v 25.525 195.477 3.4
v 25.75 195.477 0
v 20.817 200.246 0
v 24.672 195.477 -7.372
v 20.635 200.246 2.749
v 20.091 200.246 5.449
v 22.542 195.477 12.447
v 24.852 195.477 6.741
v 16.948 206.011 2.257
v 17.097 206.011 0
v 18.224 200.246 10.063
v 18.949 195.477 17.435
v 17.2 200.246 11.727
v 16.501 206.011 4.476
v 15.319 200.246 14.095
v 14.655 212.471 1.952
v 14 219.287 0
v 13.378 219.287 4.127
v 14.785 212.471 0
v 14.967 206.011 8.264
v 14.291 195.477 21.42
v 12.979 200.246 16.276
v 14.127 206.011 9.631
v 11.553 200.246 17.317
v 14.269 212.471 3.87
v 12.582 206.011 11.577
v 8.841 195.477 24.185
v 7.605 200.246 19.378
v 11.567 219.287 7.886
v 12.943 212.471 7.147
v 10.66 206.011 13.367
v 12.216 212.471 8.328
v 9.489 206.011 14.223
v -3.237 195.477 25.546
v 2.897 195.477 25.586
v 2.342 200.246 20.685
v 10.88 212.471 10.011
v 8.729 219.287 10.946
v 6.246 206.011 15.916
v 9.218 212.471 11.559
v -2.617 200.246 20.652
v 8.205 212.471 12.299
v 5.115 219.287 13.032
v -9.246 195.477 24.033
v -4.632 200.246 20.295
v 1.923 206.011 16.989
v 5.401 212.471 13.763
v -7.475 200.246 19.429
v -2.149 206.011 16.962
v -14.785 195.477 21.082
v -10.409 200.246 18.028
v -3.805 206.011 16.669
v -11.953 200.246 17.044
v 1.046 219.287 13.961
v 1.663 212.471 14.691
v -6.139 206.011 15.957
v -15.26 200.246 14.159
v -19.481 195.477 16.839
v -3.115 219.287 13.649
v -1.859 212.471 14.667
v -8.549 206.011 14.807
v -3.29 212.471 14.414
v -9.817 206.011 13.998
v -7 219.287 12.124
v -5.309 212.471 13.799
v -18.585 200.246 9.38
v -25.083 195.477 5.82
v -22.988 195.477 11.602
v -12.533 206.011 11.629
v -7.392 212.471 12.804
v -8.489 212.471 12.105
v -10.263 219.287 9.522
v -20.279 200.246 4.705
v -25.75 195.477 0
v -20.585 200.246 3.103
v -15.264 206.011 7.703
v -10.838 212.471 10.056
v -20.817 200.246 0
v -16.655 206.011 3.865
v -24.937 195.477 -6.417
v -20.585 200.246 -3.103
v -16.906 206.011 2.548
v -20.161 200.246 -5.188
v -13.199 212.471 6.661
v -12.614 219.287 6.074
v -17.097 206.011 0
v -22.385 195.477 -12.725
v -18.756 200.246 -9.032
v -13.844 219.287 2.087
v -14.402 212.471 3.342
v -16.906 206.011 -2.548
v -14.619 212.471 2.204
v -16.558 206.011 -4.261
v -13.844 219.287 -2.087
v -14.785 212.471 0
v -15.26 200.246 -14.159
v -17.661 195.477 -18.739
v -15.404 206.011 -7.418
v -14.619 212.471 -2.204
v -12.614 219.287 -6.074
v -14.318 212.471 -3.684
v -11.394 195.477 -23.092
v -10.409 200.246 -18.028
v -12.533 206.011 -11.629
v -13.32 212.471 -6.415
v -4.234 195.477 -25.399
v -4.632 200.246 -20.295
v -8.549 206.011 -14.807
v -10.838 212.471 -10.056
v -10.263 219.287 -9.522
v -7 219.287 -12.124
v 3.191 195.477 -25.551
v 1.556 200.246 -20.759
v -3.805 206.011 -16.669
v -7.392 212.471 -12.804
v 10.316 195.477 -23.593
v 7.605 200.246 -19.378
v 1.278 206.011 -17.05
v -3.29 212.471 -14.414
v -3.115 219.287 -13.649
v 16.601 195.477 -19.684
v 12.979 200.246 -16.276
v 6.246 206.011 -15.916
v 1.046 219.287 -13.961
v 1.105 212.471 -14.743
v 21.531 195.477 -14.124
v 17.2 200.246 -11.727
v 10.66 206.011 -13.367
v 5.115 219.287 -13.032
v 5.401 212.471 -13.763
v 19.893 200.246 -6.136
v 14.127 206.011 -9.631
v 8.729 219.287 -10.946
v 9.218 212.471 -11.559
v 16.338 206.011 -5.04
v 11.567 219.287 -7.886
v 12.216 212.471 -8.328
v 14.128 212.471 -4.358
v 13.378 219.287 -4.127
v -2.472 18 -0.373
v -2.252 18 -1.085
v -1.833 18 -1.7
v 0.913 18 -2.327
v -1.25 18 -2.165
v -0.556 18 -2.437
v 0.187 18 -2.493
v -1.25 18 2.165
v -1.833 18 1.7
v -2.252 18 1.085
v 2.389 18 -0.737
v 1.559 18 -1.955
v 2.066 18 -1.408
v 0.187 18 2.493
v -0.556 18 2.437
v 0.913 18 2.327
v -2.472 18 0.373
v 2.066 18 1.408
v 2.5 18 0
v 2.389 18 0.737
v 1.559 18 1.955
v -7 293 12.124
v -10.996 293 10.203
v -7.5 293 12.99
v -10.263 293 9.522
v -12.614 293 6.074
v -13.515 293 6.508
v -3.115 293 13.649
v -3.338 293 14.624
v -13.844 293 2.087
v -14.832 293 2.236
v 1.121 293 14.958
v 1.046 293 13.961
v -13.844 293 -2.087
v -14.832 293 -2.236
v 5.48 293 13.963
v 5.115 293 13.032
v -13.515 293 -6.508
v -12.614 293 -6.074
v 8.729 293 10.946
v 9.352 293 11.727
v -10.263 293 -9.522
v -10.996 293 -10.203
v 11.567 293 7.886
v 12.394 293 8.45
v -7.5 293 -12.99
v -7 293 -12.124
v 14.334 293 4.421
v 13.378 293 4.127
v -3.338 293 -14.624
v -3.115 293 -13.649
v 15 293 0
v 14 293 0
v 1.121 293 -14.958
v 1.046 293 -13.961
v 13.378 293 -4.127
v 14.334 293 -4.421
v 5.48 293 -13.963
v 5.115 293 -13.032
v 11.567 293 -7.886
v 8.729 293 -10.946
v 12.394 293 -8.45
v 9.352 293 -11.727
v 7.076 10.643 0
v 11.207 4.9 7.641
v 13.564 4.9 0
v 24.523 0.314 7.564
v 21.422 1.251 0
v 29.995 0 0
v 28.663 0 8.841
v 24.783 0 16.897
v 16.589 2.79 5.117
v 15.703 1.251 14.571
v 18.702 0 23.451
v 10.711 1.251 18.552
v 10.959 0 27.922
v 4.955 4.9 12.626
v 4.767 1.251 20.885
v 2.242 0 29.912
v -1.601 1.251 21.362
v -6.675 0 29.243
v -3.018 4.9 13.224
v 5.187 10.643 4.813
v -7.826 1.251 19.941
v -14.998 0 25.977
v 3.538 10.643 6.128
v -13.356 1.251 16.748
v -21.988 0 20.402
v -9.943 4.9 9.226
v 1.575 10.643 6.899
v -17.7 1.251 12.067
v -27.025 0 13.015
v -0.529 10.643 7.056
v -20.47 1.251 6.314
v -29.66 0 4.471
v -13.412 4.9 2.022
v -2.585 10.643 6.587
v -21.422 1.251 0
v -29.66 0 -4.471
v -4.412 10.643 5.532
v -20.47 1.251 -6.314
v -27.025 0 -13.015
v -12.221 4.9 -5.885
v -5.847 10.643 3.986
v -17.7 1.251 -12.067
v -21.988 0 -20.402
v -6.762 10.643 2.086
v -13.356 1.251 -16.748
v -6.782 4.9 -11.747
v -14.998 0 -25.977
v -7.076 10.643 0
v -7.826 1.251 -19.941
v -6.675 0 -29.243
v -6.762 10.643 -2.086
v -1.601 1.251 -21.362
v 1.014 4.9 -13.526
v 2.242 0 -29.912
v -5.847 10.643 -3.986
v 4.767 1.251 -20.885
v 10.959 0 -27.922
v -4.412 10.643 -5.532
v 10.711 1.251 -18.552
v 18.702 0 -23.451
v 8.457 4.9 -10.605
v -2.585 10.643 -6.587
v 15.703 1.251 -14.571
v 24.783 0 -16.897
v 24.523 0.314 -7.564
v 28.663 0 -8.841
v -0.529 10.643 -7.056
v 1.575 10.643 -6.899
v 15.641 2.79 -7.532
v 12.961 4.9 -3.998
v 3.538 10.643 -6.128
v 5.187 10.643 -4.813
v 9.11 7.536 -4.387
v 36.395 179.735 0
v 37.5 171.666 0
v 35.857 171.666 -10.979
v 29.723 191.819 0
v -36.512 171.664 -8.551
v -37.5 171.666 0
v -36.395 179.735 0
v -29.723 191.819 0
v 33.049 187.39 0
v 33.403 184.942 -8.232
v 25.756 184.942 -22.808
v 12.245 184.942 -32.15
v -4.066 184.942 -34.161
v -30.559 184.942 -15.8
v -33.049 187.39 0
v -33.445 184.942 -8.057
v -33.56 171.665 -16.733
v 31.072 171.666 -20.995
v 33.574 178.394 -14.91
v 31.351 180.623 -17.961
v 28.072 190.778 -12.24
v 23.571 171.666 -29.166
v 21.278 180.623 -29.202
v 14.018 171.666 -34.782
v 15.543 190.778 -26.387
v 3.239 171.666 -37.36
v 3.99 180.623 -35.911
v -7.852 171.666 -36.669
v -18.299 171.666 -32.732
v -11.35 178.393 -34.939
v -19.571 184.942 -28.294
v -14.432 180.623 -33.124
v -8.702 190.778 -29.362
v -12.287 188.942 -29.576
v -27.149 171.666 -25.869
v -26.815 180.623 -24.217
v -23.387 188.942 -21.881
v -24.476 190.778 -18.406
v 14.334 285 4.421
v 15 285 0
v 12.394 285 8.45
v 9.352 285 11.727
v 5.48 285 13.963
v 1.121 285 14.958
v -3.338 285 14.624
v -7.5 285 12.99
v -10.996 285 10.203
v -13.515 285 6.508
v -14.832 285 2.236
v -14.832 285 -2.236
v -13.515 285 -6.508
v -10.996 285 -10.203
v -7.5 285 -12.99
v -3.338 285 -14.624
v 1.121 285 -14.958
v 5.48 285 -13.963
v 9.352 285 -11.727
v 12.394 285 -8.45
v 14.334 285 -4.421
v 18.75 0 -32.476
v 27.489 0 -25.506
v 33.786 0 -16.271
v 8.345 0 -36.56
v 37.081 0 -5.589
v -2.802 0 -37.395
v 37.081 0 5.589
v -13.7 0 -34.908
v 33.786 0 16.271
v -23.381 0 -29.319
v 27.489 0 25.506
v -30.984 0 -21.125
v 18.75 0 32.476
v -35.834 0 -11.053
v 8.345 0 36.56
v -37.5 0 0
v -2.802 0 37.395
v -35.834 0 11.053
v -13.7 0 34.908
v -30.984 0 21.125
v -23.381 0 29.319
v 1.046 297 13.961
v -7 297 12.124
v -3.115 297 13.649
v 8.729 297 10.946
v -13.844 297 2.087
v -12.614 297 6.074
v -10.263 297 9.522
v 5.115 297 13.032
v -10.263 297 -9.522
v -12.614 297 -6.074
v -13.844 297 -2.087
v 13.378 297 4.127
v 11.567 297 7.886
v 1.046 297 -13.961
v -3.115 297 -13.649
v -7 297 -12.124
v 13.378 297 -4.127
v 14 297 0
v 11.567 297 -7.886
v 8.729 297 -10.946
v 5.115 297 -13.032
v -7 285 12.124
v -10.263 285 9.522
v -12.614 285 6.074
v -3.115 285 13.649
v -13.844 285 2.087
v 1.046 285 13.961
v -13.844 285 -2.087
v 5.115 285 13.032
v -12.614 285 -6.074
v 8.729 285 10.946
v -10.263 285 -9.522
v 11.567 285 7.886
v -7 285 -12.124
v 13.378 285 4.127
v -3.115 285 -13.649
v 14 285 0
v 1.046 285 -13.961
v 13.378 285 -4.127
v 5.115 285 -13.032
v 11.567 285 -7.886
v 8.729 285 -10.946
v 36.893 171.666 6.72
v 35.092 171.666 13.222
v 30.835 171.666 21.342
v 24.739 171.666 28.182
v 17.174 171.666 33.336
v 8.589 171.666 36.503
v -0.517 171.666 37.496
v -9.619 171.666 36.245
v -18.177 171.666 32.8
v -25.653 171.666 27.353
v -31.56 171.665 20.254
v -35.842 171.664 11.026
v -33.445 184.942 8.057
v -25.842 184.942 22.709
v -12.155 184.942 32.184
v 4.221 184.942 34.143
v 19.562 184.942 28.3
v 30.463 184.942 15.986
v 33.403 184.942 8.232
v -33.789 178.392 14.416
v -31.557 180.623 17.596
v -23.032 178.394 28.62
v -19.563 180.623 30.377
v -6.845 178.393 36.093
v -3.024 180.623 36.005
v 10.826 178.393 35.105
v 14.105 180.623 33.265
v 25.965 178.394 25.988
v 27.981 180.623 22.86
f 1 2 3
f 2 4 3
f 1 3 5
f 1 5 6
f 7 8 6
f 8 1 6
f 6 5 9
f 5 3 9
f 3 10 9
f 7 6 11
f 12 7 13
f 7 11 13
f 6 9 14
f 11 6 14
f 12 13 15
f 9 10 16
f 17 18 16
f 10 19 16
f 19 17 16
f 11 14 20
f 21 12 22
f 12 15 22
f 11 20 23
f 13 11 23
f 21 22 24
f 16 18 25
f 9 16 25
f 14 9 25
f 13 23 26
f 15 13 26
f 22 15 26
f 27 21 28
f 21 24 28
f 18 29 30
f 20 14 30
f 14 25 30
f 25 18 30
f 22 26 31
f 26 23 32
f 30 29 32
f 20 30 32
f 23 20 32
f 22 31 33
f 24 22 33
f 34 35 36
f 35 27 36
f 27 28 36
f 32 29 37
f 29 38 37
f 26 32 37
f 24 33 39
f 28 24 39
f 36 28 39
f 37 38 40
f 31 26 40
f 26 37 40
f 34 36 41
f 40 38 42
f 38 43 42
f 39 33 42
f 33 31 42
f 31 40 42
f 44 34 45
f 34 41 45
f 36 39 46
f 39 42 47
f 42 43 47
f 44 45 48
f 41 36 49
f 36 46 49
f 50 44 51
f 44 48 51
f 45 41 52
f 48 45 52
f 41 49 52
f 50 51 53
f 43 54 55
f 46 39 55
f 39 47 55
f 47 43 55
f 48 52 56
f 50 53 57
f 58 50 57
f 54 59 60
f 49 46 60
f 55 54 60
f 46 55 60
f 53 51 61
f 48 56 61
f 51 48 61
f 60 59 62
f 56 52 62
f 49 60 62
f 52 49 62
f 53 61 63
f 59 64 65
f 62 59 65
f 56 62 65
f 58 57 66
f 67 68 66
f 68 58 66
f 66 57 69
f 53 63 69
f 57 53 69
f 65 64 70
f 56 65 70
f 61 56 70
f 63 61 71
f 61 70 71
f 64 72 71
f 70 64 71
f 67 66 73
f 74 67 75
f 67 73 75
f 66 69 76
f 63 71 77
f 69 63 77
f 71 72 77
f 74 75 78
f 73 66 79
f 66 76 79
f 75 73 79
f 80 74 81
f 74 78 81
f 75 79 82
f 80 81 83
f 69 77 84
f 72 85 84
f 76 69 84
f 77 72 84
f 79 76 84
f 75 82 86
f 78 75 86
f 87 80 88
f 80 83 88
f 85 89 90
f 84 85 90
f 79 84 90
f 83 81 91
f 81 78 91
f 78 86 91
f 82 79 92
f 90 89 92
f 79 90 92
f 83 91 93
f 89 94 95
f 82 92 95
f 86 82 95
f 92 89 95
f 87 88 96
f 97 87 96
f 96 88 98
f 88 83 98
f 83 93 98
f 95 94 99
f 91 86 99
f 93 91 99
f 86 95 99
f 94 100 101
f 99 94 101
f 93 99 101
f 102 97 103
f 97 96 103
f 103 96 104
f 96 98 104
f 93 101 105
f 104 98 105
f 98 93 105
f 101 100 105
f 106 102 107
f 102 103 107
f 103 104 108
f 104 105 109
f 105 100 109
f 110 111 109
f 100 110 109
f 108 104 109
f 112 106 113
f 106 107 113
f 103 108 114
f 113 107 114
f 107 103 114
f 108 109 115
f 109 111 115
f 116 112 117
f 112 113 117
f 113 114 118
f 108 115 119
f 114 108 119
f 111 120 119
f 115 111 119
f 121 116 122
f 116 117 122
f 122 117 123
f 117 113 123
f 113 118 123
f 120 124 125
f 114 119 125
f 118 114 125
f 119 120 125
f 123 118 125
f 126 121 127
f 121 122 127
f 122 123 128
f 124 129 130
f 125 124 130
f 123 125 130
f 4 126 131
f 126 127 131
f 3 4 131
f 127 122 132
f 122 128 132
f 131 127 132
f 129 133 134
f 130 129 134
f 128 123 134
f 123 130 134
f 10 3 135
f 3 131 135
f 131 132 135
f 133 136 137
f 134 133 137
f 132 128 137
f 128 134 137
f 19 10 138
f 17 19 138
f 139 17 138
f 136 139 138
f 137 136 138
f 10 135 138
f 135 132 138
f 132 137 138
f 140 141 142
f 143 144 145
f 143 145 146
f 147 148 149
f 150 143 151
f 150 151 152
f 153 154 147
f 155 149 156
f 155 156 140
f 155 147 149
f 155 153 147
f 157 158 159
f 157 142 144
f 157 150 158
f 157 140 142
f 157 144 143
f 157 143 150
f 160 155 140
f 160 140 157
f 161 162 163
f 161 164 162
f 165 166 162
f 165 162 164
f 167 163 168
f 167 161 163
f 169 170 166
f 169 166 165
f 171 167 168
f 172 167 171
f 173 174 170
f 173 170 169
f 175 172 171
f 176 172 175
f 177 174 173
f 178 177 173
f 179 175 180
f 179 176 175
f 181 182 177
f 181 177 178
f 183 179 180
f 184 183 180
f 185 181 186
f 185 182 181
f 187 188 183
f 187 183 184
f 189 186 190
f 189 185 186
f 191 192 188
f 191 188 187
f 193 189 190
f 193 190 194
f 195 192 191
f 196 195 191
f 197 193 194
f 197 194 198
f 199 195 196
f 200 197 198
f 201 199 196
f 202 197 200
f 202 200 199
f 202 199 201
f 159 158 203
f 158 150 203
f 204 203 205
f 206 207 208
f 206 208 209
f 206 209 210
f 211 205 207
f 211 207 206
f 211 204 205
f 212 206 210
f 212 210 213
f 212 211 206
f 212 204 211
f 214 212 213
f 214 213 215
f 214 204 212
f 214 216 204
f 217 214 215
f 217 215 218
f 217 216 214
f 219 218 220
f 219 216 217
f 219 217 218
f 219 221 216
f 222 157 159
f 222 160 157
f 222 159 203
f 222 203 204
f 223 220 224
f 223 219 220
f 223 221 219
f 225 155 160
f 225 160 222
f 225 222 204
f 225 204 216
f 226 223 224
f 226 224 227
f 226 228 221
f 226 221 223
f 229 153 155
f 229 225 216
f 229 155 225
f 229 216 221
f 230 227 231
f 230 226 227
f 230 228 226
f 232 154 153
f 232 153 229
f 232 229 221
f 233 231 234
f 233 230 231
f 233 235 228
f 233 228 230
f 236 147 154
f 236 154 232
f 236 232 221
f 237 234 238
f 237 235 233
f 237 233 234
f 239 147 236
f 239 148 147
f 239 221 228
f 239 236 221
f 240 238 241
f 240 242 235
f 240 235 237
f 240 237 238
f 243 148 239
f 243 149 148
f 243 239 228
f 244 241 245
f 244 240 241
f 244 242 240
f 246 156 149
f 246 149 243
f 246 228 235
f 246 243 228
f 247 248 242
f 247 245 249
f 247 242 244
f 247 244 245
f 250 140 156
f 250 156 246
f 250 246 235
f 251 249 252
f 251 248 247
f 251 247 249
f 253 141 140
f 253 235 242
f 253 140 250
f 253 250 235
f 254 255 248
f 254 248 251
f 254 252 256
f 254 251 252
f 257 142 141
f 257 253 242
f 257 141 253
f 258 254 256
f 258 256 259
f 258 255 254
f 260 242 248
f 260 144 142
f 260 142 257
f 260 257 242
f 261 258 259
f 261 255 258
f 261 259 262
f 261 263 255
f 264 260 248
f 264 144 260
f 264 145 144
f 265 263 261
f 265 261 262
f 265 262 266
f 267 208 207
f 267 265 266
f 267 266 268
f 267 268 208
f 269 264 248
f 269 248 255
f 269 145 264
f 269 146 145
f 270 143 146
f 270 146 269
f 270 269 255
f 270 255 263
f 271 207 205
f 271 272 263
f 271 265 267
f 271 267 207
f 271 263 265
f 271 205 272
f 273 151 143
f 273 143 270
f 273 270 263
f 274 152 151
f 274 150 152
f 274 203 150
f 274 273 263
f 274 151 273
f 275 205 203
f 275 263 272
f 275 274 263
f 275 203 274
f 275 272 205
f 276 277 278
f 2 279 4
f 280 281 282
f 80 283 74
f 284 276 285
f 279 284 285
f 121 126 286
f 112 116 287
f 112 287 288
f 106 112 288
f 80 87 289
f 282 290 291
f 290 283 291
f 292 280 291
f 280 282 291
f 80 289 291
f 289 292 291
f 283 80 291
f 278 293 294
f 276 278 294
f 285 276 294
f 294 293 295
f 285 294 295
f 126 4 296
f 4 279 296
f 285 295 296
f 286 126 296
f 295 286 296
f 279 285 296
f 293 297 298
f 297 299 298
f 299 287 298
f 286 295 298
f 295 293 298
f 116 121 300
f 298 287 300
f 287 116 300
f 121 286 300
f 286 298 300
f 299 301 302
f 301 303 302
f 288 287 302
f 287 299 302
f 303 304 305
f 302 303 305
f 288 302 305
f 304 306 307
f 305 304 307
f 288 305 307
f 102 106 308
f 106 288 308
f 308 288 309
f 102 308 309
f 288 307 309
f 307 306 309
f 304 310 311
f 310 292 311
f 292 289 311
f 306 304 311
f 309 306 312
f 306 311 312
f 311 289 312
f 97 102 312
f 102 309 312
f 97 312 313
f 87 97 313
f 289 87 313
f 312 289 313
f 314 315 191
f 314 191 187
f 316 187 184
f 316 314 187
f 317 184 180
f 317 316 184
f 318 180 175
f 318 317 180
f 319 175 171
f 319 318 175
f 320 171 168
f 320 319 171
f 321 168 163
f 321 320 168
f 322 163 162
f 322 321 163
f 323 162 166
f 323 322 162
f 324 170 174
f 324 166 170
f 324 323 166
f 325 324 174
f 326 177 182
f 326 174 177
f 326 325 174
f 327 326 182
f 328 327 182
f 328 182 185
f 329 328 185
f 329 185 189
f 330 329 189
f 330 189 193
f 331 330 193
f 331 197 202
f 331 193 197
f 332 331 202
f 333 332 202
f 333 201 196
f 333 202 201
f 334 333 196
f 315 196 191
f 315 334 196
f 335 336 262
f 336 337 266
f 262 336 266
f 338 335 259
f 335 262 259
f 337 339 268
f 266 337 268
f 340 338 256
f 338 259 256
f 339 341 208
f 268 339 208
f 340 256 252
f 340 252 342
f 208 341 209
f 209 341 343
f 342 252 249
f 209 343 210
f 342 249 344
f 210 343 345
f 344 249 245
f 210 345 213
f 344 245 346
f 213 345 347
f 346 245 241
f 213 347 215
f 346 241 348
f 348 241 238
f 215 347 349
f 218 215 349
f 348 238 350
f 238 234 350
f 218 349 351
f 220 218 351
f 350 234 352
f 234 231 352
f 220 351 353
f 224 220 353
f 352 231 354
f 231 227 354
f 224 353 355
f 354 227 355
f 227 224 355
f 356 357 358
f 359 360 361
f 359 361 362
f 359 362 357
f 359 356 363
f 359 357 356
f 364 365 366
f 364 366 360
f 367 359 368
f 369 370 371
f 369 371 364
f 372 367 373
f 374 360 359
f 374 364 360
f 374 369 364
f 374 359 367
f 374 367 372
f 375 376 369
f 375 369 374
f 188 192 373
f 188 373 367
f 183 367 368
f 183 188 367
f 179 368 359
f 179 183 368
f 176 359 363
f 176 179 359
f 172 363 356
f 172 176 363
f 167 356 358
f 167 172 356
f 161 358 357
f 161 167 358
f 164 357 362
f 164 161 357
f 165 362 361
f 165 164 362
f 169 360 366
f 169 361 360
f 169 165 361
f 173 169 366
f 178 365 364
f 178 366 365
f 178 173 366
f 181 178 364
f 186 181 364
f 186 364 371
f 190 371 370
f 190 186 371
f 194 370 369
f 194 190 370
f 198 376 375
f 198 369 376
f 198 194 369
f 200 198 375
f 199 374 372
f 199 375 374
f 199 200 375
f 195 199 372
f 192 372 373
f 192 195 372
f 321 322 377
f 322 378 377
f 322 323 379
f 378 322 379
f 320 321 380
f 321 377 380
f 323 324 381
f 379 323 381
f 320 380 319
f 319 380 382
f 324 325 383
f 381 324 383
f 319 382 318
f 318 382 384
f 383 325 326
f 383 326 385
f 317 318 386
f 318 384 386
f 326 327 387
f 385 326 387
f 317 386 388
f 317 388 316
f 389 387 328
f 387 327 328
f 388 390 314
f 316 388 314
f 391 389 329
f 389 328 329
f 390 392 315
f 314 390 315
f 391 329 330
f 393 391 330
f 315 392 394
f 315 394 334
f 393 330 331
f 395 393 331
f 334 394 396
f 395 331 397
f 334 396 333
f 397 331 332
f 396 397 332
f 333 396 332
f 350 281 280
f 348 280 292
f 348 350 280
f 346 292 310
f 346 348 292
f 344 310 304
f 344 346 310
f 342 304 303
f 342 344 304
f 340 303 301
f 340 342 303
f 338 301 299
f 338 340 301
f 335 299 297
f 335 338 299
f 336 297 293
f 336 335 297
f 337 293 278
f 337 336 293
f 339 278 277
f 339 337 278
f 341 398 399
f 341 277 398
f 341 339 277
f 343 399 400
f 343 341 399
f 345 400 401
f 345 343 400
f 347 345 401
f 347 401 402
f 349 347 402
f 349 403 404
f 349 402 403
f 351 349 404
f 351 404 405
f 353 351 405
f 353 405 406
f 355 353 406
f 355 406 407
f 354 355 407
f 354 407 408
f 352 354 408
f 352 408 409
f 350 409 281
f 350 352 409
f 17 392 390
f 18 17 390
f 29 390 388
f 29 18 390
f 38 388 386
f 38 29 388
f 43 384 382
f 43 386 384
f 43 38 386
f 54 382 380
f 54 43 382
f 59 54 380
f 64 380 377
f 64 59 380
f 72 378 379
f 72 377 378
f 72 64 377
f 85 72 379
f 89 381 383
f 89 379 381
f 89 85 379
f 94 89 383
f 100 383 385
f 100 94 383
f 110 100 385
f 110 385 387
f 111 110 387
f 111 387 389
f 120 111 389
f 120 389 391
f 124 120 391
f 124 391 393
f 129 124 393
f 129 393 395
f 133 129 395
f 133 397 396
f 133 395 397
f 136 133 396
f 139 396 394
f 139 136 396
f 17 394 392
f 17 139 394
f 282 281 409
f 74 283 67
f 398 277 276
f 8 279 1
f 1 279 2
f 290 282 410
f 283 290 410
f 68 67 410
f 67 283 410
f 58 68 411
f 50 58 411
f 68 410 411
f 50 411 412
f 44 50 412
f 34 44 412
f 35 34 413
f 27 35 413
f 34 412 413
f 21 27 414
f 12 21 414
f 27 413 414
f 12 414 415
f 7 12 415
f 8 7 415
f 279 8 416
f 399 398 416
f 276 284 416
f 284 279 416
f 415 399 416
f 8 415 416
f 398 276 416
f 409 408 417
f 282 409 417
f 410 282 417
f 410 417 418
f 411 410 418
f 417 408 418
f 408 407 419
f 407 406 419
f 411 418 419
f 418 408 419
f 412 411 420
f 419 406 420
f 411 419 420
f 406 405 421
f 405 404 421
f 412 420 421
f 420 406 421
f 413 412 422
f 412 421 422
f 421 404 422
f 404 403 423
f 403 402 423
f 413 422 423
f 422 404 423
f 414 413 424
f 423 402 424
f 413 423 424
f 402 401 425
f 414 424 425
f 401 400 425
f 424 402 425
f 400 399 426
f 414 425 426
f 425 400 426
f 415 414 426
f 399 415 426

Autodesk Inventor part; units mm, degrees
ref_plane "YZ Plane" through (0, 0, 0) normal (1, 0, 0) x (0, 1, 0)
ref_plane "XZ Plane" through (0, 0, 0) normal (0, 1, 0) x (-1, 0, 0)
ref_plane "XY Plane" through (0, 0, 0) normal (0, 0, 1) x (1, 0, 0)
sketch "Boceto1" plane through (0, 0, 0) normal (0, 0, 1) x (1, 0, 0)
  point P0 (0, 0)
sketch "Boceto2" plane through (0, 0, 0) normal (0, 1, 0) x (-1, 0, 0)
  point P0 (0, 0)
sketch "Boceto3" plane through (0, 0, 0) normal (0, 1, 0) x (-1, 0, 0)
  circle A0 centre (0, 0) radius 37.5
  dimension "d0" = 75
extrude "Extrusión1" add sketch "Boceto3" along normal blind 190
sketch "Boceto4" plane through (0, 190, 0) normal (0, 1, 0) x (1, 0, 0)
  circle A0 centre (0, 0) radius 14
  dimension "d3" = 28
extrude "Extrusión2" add sketch "Boceto4" along normal blind 95
fillet "Empalme1" radius 30 1 edges at (-14, 190, 0)
fillet "Empalme2" radius 30 2 edges at (0, 190, -37.5) (0, 190, 37.5)
sketch "Boceto5" plane through (0, 285, 0) normal (0, 1, 0) x (1, 0, 0)
  circle A0 centre (0, 0) radius 15
  dimension "d8" = 30
extrude "Extrusión3" add sketch "Boceto5" along normal blind 8
sketch "Boceto6" plane through (0, 293, 0) normal (0, 1, 0) x (1, 0, 0)
  circle A0 centre (0, 0) radius 14
extrude "Extrusión4" add sketch "Boceto6" along normal blind 4
sketch "Boceto7" plane through (0, 0, 0) normal (0, -1, 0) x (1, 0, 0)
  circle A0 centre (0, 0) radius 2.5
  dimension "d13" = 5
extrude "Extrusión5" cut sketch "Boceto7" against normal blind 18
fillet "Empalme3" radius 30 1 edges at (-2.5, 0, 0)
properties part number "Botella_Vino"
